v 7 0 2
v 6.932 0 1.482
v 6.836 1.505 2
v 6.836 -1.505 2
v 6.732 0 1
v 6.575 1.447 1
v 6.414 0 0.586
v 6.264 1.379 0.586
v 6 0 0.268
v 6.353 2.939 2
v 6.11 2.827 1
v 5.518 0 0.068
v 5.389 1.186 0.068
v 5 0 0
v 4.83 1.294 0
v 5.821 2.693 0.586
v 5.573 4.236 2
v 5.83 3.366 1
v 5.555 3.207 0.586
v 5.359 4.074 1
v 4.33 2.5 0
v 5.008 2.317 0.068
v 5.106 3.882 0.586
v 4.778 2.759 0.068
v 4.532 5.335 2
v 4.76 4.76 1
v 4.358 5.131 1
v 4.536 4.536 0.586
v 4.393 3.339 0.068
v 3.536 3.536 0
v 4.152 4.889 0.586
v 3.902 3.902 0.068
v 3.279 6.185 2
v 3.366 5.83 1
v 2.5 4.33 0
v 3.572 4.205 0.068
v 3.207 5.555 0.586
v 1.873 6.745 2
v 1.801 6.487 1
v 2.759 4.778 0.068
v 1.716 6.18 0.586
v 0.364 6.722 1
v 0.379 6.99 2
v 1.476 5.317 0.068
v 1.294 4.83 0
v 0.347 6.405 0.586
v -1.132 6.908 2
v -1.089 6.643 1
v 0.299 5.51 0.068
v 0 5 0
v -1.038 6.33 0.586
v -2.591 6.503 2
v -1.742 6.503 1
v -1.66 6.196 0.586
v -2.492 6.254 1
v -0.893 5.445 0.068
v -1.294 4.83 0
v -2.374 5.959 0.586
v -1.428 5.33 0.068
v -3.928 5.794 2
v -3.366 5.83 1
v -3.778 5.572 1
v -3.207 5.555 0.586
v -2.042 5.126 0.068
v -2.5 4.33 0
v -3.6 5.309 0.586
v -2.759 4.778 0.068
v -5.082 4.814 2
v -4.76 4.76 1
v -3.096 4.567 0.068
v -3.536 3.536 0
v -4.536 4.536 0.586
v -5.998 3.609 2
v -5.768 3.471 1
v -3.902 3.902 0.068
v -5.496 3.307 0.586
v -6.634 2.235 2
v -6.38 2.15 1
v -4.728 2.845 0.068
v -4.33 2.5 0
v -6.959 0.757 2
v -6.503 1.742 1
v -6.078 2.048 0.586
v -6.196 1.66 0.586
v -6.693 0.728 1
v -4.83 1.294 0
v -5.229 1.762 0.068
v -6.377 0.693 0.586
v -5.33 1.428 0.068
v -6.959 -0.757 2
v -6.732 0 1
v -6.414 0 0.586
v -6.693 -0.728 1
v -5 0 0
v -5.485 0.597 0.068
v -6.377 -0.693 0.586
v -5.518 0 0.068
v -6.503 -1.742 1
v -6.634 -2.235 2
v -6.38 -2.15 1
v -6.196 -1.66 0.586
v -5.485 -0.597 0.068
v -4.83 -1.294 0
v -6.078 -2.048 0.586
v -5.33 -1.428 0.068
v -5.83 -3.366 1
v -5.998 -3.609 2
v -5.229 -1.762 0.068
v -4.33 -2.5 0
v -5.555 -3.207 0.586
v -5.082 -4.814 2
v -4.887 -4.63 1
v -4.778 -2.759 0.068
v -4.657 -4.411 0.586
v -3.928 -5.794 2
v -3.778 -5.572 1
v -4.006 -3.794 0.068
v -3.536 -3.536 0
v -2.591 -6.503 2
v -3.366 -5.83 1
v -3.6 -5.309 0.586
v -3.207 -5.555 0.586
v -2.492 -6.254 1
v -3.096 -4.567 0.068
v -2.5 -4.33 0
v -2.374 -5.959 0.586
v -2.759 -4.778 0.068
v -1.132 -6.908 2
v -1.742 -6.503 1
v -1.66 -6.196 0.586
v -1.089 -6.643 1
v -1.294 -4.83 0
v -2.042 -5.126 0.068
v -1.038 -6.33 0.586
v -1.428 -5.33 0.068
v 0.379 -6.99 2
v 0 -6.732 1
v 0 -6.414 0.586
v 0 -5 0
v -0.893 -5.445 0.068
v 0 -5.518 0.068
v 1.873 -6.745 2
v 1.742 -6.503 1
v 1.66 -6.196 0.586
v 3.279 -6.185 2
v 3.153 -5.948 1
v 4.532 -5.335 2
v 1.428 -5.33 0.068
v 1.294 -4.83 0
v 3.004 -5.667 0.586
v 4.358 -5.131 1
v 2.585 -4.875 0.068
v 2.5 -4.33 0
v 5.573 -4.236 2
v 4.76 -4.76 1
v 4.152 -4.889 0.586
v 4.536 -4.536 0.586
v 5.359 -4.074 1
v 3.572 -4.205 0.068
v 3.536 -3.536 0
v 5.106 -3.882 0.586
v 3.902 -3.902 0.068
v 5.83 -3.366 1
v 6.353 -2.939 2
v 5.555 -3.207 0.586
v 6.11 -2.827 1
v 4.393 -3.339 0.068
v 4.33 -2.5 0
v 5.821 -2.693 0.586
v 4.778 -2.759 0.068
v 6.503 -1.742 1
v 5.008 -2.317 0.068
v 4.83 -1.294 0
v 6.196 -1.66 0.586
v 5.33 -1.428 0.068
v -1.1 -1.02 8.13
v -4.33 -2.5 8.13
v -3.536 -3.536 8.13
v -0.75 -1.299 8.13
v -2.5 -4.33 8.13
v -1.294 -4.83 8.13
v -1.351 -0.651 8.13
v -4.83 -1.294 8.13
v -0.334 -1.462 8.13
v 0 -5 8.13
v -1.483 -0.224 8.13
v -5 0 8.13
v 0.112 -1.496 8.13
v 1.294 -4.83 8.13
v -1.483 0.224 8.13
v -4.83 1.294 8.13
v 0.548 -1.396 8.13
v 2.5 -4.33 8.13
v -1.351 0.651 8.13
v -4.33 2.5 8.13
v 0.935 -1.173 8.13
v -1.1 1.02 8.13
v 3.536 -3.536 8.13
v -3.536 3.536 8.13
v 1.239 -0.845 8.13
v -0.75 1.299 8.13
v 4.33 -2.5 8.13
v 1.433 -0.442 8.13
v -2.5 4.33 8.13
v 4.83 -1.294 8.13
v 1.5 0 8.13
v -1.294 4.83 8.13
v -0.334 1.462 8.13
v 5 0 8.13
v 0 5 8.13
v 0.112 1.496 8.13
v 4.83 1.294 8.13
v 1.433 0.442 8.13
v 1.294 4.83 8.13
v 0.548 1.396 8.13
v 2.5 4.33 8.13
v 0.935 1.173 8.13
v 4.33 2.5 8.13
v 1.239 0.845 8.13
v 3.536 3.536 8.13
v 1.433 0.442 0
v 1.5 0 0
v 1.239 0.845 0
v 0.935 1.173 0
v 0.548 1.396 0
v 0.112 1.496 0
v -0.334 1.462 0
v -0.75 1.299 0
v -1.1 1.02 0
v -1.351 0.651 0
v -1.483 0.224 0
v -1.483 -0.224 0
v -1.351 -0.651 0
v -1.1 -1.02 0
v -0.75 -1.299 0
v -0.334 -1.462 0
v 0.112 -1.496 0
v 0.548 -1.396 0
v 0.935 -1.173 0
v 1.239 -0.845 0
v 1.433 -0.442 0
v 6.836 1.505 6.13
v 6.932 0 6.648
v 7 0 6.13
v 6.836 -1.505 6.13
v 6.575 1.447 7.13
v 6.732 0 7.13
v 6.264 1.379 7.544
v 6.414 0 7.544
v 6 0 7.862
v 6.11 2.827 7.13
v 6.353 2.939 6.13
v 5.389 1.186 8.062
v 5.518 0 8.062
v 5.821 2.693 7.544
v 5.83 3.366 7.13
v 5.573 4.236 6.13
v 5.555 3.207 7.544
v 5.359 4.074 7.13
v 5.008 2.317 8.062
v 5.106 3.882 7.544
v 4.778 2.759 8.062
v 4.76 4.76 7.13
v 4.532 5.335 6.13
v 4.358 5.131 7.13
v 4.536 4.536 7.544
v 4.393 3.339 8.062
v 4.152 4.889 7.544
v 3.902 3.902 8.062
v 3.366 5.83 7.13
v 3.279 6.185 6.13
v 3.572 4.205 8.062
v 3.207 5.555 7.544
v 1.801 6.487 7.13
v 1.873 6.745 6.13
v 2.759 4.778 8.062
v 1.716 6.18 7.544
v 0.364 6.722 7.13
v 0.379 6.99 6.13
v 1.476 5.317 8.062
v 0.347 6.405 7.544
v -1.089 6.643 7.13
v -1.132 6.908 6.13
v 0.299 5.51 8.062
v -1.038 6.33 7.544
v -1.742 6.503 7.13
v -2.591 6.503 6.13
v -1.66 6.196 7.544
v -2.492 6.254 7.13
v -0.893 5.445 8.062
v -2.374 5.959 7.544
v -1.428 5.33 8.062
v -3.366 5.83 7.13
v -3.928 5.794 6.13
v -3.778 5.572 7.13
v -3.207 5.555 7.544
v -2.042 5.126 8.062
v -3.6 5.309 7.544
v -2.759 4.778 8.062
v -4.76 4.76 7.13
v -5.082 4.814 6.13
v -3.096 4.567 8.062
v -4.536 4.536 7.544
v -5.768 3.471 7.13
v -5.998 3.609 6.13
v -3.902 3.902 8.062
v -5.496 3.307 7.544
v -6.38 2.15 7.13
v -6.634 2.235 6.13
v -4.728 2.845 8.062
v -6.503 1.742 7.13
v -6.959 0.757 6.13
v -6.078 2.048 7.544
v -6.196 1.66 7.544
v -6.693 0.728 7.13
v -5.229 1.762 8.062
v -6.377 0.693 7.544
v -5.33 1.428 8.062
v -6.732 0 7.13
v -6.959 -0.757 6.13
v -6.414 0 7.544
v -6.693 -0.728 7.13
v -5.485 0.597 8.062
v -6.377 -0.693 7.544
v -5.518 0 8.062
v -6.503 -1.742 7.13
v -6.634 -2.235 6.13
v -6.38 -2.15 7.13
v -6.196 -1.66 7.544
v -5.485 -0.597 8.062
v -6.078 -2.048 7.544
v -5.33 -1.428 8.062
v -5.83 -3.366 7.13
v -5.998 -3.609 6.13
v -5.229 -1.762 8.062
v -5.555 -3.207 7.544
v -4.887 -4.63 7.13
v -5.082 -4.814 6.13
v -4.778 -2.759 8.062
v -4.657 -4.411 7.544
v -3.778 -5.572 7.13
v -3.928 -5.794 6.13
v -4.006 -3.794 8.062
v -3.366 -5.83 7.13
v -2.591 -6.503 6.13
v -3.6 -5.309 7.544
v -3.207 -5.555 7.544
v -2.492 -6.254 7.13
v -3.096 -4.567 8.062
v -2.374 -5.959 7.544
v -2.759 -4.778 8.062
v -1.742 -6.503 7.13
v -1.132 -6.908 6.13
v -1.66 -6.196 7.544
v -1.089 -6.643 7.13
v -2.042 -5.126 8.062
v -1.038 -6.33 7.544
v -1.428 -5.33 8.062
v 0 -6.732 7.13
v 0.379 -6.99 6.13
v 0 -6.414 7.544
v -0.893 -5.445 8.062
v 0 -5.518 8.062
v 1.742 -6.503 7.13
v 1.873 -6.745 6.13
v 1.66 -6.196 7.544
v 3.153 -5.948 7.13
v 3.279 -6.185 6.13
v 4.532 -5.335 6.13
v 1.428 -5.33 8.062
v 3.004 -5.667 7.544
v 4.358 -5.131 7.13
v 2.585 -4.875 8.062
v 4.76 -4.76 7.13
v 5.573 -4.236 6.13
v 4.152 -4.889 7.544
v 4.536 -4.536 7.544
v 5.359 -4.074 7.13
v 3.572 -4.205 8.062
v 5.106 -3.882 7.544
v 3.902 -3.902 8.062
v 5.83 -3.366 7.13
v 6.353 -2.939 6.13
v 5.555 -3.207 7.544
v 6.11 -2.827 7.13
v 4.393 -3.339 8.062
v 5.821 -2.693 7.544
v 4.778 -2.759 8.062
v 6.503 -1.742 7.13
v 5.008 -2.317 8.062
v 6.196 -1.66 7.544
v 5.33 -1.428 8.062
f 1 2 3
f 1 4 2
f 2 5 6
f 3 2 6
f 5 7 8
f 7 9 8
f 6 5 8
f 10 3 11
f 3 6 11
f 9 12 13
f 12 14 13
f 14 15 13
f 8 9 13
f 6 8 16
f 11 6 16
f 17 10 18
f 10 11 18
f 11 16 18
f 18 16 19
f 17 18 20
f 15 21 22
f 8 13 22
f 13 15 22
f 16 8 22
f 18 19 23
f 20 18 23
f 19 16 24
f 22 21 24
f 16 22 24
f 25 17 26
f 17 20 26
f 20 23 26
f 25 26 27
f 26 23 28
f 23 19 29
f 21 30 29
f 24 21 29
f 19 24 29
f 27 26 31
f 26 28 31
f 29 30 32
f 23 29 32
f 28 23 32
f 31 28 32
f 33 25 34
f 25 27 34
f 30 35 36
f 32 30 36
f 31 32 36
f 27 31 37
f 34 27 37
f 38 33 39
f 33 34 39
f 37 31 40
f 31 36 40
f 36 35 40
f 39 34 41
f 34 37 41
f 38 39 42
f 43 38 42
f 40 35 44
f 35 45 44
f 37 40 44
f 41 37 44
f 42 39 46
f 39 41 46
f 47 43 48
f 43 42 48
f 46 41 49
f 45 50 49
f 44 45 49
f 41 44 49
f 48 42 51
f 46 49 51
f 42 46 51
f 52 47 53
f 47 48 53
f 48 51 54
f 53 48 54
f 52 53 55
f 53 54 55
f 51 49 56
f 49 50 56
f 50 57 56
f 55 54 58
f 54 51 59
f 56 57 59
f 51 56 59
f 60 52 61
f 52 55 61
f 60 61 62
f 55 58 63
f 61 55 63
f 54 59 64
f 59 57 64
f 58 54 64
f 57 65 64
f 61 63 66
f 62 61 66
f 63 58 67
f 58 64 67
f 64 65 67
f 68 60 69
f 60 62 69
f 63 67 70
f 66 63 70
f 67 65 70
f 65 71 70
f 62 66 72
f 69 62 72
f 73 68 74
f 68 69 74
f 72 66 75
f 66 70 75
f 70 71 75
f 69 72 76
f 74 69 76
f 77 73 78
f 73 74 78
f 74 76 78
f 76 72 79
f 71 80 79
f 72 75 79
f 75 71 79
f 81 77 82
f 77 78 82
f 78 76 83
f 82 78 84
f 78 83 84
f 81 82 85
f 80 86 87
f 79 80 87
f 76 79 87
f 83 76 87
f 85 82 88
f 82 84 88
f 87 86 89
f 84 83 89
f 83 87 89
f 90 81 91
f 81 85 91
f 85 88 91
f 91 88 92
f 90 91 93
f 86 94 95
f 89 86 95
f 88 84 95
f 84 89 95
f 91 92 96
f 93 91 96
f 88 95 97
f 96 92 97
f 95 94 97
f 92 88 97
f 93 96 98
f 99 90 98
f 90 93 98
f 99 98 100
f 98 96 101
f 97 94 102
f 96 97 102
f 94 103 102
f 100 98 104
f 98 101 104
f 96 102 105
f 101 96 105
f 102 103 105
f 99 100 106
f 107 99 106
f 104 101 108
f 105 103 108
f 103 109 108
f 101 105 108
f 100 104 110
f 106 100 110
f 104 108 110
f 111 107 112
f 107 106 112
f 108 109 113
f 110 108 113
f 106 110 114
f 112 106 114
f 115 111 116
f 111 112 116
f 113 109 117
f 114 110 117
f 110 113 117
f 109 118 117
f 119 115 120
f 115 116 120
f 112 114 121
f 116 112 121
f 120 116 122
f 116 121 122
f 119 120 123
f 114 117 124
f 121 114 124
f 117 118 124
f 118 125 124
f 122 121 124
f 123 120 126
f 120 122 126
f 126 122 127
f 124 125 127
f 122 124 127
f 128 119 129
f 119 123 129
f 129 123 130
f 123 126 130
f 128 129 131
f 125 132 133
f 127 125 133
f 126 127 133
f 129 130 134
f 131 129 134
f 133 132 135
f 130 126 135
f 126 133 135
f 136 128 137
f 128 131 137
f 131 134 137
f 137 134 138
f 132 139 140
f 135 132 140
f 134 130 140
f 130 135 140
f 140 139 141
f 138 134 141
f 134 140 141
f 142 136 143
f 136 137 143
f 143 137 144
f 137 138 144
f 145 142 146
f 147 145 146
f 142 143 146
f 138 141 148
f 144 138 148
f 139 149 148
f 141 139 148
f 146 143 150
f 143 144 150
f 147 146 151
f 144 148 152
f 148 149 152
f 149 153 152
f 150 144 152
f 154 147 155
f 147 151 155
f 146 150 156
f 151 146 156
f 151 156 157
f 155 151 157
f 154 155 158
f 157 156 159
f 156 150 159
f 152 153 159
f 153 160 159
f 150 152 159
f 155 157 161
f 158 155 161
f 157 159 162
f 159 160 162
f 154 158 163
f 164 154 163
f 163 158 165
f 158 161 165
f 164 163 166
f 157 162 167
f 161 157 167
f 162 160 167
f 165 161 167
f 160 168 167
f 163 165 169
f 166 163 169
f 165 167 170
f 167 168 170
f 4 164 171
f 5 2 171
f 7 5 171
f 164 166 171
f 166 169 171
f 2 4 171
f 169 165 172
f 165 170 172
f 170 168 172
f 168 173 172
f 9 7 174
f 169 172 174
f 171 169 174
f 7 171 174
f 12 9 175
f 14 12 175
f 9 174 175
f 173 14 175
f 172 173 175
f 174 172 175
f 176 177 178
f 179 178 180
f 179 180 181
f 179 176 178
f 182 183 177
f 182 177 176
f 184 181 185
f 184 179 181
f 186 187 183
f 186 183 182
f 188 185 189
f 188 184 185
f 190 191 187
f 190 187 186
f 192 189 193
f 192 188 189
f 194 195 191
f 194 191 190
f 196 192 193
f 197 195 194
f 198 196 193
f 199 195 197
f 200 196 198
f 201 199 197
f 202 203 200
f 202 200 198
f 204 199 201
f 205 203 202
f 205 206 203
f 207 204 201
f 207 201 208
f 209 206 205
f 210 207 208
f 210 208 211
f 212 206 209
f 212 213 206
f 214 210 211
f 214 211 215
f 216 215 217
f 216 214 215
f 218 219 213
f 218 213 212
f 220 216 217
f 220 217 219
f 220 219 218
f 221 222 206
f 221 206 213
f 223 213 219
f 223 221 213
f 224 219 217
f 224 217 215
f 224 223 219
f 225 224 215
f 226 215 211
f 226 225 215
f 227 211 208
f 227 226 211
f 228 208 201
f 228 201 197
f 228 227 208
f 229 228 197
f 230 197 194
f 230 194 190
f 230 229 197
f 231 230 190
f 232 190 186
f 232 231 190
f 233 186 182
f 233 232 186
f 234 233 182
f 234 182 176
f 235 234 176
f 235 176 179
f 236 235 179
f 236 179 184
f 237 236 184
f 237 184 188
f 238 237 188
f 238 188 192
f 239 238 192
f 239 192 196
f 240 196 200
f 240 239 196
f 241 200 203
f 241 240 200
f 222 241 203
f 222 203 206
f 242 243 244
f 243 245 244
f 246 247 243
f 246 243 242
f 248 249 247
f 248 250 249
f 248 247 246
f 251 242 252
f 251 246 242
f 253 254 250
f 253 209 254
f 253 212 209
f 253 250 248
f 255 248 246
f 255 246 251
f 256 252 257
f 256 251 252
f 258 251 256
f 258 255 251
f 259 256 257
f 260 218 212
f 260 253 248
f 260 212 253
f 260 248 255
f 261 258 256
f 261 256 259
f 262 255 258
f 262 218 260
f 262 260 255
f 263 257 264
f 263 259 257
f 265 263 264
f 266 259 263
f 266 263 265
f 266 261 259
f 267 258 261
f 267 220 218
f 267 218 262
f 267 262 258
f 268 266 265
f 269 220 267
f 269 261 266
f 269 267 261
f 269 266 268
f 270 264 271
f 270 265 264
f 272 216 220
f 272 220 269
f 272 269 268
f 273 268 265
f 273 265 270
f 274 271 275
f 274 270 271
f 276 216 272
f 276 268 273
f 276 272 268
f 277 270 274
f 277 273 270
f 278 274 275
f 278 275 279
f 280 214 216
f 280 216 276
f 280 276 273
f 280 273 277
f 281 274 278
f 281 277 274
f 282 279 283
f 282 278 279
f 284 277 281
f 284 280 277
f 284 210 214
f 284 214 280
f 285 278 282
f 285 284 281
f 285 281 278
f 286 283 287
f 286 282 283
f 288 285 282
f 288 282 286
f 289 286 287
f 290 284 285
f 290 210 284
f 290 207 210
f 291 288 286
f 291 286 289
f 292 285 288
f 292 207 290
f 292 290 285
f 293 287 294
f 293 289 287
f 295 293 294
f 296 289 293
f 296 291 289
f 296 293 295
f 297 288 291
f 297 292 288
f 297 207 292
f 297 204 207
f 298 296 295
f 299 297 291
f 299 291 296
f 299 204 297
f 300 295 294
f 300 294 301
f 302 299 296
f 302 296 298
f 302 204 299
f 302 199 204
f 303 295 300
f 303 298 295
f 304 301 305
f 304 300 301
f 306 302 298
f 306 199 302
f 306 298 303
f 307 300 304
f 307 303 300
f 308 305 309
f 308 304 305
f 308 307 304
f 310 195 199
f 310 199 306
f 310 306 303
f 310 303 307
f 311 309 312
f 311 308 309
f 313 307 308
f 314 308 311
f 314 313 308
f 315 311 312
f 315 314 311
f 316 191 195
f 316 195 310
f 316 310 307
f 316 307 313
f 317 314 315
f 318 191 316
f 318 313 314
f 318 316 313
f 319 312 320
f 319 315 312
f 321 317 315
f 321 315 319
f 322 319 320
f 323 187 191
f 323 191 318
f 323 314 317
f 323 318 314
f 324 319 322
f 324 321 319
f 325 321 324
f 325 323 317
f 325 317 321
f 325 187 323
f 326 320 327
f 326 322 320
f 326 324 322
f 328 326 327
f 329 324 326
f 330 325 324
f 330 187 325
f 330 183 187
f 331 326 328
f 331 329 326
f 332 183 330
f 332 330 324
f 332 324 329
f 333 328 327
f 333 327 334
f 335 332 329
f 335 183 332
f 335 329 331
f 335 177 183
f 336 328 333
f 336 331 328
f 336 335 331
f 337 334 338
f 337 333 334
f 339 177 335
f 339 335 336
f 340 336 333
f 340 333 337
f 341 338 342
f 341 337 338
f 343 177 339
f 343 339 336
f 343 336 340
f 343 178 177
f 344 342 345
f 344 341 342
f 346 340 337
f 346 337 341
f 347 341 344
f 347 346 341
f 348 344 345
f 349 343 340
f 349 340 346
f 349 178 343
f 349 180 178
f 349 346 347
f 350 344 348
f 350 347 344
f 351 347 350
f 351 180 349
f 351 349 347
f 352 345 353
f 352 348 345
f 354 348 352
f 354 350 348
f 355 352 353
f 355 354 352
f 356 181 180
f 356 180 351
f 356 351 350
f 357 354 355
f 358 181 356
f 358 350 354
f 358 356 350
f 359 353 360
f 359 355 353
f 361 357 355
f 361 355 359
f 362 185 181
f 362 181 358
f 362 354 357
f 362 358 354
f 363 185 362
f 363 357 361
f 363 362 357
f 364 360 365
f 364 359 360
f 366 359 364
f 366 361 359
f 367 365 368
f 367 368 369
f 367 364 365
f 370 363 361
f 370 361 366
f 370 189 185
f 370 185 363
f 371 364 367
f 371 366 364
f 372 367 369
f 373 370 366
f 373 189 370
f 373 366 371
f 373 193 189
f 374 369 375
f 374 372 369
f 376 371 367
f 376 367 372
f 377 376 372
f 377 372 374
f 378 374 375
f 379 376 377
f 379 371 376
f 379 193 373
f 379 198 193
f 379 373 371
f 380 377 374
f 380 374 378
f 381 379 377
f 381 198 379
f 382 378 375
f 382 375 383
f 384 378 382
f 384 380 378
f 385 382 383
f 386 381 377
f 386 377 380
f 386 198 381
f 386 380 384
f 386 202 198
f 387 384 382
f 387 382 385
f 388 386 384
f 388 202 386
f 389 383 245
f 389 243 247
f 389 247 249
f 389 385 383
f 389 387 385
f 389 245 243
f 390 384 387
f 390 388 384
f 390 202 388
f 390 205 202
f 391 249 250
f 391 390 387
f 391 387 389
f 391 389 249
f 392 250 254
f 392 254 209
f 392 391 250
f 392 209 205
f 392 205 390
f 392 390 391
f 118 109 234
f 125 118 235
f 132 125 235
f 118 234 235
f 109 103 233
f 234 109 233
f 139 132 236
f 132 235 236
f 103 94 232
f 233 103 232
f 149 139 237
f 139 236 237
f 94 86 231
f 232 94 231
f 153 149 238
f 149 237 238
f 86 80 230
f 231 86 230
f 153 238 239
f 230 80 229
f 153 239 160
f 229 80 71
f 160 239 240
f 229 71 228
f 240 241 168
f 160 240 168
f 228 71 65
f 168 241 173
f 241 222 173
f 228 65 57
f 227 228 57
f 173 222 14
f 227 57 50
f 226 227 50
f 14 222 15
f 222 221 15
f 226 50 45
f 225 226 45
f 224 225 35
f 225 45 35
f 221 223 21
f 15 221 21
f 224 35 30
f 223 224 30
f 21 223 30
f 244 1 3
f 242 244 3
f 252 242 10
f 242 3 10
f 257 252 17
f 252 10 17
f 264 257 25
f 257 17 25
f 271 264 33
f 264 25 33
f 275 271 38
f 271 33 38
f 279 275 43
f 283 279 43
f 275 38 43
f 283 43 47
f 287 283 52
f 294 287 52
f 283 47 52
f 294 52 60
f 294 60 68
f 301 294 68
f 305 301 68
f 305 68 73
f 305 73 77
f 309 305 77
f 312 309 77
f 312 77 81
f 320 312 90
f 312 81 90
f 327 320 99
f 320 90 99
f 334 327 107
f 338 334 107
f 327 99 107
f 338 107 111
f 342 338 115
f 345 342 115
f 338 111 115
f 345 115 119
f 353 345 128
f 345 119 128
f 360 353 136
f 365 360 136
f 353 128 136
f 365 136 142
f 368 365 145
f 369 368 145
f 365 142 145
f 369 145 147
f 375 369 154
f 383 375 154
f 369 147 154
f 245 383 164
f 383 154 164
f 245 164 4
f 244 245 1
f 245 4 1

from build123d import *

# Parameters (mm, degrees)
F0_R     = 7
F0_R_2   = 1.5
F1_DEPTH = 8.13
F2_R     = 2
F3_R     = 2


with BuildPart() as f1:
    # F0 (on Top) → F1 (new body)
    with BuildSketch(Plane.XY):
        Circle(F0_R)
        Circle(F0_R_2, mode=Mode.SUBTRACT)
    extrude(amount=F1_DEPTH)

    # F2
    f2_edges = [f1.edges().sort_by_distance(p)[0] for p in [
        (-7, 0, 8.13),
    ]]
    fillet(f2_edges, radius=F2_R)

    # F3
    f3_edges = [f1.edges().sort_by_distance(p)[0] for p in [
        (-7, 0, 0),
    ]]
    fillet(f3_edges, radius=F3_R)


solid = f1.part
